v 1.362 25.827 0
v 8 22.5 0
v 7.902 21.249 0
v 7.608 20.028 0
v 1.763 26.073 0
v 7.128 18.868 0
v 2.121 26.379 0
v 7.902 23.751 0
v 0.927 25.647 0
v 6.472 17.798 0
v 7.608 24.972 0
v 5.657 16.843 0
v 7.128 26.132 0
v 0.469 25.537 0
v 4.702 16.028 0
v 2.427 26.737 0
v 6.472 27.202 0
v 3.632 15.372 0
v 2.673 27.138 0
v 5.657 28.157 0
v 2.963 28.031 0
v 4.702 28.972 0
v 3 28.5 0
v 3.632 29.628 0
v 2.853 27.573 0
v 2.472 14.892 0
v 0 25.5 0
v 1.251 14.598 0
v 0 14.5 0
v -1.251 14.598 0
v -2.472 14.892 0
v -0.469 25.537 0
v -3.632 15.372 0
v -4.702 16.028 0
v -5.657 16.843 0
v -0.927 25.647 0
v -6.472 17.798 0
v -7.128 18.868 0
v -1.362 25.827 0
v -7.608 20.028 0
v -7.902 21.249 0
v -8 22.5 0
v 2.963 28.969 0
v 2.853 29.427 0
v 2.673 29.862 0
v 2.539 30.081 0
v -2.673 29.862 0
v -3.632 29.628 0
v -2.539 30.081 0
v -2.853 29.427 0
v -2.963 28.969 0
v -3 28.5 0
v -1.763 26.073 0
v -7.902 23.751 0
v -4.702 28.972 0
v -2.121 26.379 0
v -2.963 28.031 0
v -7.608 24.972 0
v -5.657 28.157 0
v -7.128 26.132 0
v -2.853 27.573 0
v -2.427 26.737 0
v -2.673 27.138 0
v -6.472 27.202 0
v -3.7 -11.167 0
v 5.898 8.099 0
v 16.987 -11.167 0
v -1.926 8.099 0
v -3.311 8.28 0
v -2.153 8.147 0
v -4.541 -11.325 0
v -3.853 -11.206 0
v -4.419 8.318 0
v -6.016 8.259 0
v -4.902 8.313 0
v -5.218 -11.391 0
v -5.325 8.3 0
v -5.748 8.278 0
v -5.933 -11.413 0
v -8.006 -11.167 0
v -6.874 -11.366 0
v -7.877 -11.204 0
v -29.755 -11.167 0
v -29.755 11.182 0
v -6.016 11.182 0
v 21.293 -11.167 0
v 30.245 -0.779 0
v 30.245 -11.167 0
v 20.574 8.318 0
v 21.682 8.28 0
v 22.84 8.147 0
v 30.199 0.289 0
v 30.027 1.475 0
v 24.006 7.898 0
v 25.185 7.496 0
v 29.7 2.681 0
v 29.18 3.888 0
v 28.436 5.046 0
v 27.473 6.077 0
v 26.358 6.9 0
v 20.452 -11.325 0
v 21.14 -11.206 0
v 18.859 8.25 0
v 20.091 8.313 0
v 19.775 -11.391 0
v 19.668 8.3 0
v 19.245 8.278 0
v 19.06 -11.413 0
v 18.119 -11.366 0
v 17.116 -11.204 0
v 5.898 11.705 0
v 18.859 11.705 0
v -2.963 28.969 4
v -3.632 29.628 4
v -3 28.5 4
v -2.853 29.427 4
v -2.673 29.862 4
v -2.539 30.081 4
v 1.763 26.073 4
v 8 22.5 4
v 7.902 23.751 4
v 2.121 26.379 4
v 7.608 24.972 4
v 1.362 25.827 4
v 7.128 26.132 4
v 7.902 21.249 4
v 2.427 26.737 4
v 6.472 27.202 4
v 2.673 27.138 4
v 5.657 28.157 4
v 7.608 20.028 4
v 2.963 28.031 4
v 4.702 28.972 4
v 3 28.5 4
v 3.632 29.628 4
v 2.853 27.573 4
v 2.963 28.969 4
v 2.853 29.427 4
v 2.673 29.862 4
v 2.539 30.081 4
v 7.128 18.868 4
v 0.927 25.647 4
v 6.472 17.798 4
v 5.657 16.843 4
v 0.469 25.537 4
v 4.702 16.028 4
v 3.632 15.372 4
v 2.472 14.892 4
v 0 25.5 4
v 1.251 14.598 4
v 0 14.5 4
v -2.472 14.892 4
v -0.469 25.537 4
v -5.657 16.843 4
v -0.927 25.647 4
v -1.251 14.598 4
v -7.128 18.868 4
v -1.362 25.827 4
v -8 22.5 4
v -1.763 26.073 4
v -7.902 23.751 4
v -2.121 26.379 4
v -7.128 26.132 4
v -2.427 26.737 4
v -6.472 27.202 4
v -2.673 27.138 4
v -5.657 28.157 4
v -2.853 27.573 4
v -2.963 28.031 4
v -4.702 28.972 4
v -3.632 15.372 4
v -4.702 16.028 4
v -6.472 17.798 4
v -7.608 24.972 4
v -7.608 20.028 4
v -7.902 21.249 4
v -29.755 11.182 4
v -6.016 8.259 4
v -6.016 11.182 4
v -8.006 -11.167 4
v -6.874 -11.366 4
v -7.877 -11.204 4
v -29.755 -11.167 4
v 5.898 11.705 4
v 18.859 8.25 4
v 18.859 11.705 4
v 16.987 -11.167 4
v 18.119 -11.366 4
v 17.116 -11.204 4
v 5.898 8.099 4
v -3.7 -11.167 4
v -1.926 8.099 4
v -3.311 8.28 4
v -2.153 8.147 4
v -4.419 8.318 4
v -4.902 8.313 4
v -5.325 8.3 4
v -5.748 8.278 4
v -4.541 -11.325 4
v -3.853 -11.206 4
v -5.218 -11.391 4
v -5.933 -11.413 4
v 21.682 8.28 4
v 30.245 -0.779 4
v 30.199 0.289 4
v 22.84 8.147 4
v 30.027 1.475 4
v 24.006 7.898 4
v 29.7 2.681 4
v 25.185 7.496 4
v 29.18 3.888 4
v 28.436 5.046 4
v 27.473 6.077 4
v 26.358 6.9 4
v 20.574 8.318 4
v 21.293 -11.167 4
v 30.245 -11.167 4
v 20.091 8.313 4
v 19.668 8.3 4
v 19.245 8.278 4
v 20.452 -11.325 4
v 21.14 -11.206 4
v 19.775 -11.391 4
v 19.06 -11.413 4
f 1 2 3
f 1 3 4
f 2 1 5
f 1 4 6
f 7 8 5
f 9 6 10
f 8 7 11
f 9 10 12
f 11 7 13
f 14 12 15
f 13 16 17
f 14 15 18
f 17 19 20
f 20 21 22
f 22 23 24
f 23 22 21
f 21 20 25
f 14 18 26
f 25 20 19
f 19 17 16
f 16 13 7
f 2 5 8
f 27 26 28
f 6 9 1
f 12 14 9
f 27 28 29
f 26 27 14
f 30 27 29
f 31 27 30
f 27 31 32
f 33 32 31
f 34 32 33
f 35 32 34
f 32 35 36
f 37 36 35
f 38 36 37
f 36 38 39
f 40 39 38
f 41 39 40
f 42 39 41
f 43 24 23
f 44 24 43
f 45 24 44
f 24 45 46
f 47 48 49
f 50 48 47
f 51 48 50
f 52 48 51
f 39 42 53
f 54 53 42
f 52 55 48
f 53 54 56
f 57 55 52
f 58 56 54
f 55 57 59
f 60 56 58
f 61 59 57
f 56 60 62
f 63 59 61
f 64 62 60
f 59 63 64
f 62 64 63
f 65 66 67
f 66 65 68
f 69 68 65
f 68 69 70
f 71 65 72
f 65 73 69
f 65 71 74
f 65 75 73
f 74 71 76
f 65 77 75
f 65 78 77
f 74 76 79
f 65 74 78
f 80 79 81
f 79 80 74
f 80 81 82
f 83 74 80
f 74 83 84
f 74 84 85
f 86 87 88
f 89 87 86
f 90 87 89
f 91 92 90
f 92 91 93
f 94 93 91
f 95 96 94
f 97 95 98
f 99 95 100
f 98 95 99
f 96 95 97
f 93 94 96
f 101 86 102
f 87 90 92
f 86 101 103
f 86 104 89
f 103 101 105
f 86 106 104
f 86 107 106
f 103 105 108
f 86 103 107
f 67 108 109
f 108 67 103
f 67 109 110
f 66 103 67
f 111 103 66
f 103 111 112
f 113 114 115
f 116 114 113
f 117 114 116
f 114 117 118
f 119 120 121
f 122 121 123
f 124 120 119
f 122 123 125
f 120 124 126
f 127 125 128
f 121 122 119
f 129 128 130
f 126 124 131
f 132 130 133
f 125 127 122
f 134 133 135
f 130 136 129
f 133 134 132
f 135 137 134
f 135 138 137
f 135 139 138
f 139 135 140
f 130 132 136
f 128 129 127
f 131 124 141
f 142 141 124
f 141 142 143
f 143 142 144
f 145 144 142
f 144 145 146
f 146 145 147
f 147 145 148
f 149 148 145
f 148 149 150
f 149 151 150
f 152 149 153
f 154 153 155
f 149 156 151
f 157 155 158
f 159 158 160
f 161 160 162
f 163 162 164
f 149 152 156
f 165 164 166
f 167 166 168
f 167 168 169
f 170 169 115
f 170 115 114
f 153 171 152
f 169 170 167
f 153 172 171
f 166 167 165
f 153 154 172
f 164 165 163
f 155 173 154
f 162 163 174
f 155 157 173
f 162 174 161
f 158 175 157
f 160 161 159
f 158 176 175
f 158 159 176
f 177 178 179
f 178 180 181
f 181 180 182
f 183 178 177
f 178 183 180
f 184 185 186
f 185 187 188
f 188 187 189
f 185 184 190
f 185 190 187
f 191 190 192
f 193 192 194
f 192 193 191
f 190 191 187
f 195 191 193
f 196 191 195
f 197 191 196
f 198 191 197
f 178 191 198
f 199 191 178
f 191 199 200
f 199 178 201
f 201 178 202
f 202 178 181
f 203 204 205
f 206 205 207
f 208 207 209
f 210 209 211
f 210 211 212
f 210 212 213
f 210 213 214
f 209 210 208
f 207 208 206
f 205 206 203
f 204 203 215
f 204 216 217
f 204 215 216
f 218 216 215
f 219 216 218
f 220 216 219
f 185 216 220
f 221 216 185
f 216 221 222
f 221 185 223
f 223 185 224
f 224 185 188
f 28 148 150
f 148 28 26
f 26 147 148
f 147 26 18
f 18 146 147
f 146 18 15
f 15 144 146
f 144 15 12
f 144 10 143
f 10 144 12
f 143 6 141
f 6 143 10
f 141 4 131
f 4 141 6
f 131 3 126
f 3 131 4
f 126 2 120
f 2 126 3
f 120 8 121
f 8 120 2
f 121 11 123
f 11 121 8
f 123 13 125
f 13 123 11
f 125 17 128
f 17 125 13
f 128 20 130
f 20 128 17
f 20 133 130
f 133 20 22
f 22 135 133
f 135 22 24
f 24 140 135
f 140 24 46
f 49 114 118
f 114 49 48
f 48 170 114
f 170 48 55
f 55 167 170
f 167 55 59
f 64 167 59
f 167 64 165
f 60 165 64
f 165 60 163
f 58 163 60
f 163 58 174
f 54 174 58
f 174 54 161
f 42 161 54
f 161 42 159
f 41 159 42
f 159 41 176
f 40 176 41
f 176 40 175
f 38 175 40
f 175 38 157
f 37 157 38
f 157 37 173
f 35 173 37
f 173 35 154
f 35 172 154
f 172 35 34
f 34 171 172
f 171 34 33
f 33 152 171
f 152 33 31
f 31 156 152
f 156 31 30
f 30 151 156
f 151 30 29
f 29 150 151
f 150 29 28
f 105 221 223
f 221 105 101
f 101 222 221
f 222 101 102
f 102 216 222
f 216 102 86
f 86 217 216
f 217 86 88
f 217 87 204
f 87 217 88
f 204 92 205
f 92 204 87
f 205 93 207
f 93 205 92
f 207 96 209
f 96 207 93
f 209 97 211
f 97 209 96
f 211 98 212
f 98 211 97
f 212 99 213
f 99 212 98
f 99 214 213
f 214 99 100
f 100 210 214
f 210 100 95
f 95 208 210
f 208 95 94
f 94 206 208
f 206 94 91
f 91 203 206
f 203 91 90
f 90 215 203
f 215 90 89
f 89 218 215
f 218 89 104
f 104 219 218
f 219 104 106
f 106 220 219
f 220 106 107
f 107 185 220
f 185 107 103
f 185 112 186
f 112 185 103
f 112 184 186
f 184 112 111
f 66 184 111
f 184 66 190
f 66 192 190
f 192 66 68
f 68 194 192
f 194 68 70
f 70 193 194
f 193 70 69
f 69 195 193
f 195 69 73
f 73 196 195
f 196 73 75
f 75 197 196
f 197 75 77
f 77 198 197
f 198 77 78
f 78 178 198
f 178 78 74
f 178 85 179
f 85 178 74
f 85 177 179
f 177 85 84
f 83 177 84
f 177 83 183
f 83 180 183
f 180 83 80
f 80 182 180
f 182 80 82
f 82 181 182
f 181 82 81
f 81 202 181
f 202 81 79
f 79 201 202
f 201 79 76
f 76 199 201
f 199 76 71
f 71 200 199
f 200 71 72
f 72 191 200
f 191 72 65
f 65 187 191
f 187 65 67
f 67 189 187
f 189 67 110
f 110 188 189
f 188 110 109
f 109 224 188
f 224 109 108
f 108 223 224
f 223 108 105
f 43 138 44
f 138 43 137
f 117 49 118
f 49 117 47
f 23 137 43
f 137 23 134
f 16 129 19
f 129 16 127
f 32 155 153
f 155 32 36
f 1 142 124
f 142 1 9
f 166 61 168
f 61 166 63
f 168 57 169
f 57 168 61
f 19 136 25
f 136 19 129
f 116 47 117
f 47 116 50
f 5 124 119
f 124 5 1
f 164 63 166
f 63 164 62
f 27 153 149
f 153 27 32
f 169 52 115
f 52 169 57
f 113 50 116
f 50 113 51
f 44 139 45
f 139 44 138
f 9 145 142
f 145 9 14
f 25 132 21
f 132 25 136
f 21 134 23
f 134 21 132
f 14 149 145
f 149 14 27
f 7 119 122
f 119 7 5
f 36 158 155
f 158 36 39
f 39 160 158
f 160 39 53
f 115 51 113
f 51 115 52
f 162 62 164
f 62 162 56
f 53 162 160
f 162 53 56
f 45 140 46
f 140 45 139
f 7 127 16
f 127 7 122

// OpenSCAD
// Full Name Keychain
// Simple flat keychain with name text, single color

// --- Parameters ---
Name         = "Maria";
Font         = "Bebas Neue";
Name_Size    = 50;
Padding      = 5;
Thickness    = 4;
Ring_Hole_D  = 6;

$fn = 40;

module name_shape(txt, fnt) {
  resize([Name_Size, 0, 0], auto=true)
  text(txt, size=20, font=fnt, halign="center", valign="center");
}

module ring_hole() {
  // Position hole above the text bounding box
  translate([0, Name_Size * 0.35 + Padding + Ring_Hole_D, 0])
  circle(d=Ring_Hole_D);
}

module keychain_2d(txt, fnt) {
  union() {
    // Text with padding as background
    offset(delta=Padding)
    name_shape(txt, fnt);

    // Stem to ring hole
    hull() {
      translate([0, Name_Size * 0.35 + Padding])
      circle(d=Ring_Hole_D + Padding * 2);

      translate([-Ring_Hole_D / 2, Name_Size * 0.35 + Padding * 0.5])
      square([Ring_Hole_D, 1]);
    }
  }
}

difference() {
  linear_extrude(Thickness)
  keychain_2d(Name, str(Font, ":style=Bold"));

  translate([0, Name_Size * 0.35 + Padding + Ring_Hole_D, Thickness / 2 - Ring_Hole_D / 2])
  linear_extrude(Thickness + 1)
  circle(d=Ring_Hole_D);
}
